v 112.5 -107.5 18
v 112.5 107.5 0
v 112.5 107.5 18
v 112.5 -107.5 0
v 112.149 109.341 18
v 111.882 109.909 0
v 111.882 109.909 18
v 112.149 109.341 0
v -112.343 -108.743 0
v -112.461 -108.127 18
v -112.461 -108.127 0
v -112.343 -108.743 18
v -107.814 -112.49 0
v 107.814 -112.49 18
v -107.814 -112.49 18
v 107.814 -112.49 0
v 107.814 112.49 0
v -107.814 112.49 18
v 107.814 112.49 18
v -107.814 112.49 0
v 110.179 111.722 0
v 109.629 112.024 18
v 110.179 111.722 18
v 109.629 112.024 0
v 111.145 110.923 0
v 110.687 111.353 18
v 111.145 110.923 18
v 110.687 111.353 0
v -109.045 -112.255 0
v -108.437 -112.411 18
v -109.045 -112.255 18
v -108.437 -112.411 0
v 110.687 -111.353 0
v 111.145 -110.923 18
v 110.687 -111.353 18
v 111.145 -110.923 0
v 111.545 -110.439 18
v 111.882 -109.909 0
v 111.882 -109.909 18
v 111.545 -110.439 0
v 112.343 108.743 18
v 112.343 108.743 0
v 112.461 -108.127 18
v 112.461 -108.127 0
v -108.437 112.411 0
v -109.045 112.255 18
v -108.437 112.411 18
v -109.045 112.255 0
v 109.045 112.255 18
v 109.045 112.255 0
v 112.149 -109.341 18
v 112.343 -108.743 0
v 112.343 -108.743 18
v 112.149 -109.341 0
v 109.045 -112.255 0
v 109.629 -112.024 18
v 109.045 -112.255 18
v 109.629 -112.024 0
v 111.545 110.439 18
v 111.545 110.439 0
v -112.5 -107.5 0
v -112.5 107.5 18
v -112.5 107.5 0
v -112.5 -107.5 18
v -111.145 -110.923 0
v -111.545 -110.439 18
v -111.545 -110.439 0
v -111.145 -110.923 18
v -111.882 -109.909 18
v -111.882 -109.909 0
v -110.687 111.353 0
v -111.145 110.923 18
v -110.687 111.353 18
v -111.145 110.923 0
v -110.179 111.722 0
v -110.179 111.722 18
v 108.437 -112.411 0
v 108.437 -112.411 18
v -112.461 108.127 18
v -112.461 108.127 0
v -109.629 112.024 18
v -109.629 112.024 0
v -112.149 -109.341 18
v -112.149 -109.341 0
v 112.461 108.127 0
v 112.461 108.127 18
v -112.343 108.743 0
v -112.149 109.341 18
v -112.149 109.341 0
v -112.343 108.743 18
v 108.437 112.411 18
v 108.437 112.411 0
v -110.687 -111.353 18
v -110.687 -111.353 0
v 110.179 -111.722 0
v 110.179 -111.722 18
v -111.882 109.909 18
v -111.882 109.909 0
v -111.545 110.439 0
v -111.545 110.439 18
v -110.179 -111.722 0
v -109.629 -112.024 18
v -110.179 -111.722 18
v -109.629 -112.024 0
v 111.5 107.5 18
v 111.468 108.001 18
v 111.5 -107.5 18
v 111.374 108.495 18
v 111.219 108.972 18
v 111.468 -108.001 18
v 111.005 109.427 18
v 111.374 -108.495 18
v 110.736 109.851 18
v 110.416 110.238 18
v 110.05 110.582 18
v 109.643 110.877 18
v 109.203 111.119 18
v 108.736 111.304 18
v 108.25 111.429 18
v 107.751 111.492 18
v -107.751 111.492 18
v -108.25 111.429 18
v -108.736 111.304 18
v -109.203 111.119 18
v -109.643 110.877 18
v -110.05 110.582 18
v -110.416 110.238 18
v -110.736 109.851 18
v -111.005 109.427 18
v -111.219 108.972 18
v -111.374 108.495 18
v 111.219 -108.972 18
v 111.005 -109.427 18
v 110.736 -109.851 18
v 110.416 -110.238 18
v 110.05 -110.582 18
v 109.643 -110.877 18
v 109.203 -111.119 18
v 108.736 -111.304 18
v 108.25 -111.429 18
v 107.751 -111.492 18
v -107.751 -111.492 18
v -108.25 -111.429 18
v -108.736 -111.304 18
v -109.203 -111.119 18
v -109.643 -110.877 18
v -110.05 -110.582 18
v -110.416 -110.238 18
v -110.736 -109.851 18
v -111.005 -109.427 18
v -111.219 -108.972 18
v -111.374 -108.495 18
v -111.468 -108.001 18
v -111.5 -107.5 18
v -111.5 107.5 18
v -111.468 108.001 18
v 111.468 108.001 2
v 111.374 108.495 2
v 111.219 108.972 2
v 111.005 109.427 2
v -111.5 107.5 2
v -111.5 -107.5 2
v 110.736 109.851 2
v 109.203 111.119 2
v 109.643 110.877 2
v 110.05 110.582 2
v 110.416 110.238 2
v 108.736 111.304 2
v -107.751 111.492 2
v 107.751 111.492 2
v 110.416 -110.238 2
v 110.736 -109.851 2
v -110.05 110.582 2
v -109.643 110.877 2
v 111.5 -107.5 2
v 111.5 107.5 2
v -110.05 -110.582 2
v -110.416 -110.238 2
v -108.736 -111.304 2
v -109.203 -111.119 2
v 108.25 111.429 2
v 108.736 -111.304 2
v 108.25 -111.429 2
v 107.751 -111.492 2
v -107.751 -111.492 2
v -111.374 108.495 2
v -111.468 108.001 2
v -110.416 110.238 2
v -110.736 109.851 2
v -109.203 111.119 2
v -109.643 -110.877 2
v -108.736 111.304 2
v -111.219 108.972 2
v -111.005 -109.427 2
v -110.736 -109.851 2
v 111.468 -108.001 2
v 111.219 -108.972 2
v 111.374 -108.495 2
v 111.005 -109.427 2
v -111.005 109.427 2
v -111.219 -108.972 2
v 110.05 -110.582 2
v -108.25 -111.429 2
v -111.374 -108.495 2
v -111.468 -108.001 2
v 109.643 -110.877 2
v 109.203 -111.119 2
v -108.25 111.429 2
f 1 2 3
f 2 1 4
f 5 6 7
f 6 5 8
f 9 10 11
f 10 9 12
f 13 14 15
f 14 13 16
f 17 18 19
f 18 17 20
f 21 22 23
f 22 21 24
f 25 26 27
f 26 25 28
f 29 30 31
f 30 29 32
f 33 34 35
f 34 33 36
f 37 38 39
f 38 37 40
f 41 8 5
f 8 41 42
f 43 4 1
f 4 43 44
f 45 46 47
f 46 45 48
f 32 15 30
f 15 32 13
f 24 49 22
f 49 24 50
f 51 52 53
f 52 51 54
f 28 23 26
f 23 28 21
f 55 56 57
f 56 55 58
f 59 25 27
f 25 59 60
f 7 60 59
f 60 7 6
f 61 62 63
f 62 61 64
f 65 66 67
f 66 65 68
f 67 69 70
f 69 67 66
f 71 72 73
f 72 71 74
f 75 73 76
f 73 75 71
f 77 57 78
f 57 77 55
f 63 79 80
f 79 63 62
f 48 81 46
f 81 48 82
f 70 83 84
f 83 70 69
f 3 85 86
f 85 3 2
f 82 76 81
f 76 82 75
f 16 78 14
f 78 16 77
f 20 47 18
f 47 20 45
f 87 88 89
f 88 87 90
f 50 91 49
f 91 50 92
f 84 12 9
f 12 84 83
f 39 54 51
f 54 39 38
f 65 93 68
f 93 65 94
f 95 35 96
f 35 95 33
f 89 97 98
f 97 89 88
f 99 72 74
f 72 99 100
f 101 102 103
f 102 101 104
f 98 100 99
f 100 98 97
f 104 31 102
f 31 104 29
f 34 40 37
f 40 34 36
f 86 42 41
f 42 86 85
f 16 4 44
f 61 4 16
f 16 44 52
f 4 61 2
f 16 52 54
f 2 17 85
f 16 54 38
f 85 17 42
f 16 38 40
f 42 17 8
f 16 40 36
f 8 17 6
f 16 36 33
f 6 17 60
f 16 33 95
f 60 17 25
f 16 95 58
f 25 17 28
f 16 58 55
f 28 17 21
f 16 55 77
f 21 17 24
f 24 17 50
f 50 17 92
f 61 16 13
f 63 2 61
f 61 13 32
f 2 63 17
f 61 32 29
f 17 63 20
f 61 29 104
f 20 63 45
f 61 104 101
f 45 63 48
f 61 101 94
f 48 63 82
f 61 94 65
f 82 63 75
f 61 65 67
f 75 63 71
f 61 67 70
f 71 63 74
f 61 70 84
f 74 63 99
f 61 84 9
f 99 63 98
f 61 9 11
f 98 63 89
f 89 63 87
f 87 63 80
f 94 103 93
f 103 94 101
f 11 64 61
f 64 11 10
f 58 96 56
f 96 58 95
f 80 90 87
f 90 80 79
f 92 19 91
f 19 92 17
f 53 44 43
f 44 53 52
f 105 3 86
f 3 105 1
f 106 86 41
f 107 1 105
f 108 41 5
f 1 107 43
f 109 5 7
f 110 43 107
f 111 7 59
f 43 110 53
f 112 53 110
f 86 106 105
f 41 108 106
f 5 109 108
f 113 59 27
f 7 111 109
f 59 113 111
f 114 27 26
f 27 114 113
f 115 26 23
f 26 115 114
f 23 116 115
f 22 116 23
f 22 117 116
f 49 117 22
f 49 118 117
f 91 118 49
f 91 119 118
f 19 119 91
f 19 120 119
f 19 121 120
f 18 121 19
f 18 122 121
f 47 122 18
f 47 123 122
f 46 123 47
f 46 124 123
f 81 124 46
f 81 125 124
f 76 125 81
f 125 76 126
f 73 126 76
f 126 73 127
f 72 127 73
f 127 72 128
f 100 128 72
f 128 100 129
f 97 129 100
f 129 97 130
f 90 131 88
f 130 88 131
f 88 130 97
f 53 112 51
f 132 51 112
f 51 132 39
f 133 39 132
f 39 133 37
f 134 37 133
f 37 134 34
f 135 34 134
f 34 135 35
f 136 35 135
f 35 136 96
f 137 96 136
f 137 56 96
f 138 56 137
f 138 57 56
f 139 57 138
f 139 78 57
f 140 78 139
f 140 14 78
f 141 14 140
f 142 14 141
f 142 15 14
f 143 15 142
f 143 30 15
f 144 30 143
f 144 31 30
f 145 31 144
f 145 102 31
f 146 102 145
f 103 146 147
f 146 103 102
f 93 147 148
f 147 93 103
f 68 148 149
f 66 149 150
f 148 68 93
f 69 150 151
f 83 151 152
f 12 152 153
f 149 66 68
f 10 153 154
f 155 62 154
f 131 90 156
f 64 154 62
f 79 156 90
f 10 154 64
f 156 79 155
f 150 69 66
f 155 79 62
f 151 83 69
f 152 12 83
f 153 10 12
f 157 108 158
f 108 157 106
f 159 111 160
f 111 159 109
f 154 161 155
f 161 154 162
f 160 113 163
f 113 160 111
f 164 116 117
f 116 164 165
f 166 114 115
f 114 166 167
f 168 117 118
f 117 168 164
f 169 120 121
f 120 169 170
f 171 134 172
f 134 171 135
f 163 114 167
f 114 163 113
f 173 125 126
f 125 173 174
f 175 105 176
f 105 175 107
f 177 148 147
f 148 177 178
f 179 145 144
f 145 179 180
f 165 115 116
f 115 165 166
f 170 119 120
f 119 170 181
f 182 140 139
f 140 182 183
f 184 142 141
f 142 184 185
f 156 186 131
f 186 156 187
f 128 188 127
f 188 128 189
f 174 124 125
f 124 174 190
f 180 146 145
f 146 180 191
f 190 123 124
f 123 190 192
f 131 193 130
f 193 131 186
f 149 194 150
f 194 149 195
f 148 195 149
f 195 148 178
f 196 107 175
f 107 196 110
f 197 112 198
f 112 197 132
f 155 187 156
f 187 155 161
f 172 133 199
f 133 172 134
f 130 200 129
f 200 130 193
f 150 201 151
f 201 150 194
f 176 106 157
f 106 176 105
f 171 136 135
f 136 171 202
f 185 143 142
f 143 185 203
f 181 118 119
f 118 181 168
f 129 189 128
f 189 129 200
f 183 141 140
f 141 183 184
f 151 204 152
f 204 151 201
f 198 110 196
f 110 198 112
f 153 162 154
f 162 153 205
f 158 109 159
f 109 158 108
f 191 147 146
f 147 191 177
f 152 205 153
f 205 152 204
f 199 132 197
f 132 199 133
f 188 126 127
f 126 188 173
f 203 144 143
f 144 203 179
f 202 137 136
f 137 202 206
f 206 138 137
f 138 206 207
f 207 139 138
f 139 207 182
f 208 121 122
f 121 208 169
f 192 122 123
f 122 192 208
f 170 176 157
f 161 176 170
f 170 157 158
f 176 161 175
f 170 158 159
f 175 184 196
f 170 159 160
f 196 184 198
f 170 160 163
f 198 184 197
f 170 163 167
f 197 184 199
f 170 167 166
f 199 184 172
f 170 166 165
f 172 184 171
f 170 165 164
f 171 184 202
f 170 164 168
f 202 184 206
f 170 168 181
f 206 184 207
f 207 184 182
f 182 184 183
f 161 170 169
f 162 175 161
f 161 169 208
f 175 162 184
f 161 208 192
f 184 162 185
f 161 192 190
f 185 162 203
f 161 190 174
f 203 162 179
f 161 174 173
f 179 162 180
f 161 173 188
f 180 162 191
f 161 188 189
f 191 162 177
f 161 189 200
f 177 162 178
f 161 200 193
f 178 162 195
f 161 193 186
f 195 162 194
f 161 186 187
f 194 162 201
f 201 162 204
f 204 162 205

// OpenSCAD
$fn = 50;


difference() {
	union() {
		hull() {
			translate(v = [-107.5000000000, 107.5000000000, 0]) {
				cylinder(h = 18, r = 5);
			}
			translate(v = [107.5000000000, 107.5000000000, 0]) {
				cylinder(h = 18, r = 5);
			}
			translate(v = [-107.5000000000, -107.5000000000, 0]) {
				cylinder(h = 18, r = 5);
			}
			translate(v = [107.5000000000, -107.5000000000, 0]) {
				cylinder(h = 18, r = 5);
			}
		}
	}
	union() {
		translate(v = [0, 0, 2]) {
			hull() {
				translate(v = [-107.5000000000, 107.5000000000, 0]) {
					cylinder(h = 16, r = 4);
				}
				translate(v = [107.5000000000, 107.5000000000, 0]) {
					cylinder(h = 16, r = 4);
				}
				translate(v = [-107.5000000000, -107.5000000000, 0]) {
					cylinder(h = 16, r = 4);
				}
				translate(v = [107.5000000000, -107.5000000000, 0]) {
					cylinder(h = 16, r = 4);
				}
			}
		}
	}
}
